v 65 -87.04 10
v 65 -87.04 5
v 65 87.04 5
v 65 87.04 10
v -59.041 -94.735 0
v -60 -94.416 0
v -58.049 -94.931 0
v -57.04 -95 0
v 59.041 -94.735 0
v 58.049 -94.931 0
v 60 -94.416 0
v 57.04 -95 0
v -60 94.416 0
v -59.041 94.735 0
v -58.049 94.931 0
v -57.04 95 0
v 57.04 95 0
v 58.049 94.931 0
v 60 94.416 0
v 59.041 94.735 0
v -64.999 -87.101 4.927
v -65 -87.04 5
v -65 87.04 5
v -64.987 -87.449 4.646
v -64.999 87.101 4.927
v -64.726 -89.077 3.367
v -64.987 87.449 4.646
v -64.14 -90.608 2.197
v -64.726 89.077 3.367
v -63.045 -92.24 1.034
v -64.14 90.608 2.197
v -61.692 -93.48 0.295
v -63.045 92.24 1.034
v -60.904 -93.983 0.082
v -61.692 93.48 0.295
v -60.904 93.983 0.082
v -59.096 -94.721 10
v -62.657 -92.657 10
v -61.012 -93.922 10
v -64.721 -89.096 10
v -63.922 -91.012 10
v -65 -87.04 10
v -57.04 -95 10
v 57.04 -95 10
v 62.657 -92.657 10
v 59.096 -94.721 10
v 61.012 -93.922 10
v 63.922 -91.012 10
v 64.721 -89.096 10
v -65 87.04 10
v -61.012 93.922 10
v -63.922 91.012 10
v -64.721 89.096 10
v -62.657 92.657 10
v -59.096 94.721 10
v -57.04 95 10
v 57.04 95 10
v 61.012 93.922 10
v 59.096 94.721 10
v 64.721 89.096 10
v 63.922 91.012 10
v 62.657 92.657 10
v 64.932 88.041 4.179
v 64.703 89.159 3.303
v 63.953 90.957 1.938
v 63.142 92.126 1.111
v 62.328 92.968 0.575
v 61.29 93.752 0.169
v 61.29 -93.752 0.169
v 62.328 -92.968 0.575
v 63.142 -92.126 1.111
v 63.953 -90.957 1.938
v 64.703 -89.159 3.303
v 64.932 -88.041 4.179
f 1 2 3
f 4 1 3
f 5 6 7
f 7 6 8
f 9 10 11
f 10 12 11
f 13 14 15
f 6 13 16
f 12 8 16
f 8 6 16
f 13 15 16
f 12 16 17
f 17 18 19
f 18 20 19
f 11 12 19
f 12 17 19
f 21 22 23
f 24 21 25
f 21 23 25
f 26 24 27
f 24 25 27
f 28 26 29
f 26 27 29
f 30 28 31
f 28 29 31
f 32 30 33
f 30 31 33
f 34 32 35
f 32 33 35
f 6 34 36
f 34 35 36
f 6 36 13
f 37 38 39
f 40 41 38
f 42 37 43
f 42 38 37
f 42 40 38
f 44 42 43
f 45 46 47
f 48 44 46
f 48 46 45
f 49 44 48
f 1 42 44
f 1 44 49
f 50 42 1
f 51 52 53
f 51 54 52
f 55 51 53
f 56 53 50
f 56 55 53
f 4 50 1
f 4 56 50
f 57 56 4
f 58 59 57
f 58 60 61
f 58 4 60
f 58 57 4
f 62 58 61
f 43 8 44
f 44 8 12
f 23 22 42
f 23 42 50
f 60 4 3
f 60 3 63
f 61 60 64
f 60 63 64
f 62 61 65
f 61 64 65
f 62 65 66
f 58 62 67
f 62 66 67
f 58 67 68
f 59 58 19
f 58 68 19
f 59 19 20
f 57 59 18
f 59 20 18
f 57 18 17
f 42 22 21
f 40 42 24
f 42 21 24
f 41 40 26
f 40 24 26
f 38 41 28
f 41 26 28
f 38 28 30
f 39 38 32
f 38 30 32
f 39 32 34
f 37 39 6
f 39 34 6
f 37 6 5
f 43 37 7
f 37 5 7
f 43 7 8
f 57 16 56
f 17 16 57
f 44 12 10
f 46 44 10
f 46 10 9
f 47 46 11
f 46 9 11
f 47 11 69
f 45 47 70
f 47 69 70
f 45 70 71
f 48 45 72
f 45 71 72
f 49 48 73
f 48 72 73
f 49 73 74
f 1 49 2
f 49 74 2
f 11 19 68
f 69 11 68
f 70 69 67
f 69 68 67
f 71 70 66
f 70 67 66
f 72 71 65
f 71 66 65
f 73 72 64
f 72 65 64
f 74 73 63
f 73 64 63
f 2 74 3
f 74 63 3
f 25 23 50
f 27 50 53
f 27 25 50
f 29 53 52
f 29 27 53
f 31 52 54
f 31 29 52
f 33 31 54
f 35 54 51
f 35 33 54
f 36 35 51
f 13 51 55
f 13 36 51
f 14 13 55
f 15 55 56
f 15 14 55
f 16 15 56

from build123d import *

# Parameters (mm, degrees)
F0_W        = 130
F0_H        = 190
F1_DEPTH    = 10
F2_T1_DEPTH = 49.9995000031
F3_T1_DEPTH = 199.0801997502


# Not quite as in the source:
# - a fillet or chamfer that OpenCascade refuses, or shapes differently, is made with other operations: its cross-section is extruded or revolved along the edge and cut away or added


with BuildPart() as f1:
    # F0 (on Top) → F1 (new body)
    with BuildSketch(Plane.XY):
        Rectangle(F0_W, F0_H)
    extrude(amount=F1_DEPTH)

    # F2: fillet of radius 8 on 4 edges, made by hand

    # F2_s2 → F2_t1 (cut)
    with BuildSketch(Plane.XY.offset(-19.9997500016)):
        with BuildLine():
            ThreePointArc((-65.0001, 87.0001), (-62.6569542495, 92.6569542495), (-57.0001, 95.0001))
            Line((-57.0001, 95.0001), (-57.0001, 95.1601))
            ThreePointArc((-57.0001, 95.1601), (-61.00005, 95.16), (-65, 95.16))
            Line((-65, 95.16), (-65.16, 95))
            ThreePointArc((-65.16, 95), (-65.16, 91.00005), (-65.1601, 87.0001))
            Line((-65.1601, 87.0001), (-65.0001, 87.0001))
        make_face()
        with BuildLine():
            ThreePointArc((65.0001, 87.0001), (62.6569542495, 92.6569542495), (57.0001, 95.0001))
            Line((57.0001, 95.0001), (57.0001, 95.1601))
            ThreePointArc((57.0001, 95.1601), (61.00005, 95.16), (65, 95.16))
            Line((65, 95.16), (65.16, 95))
            ThreePointArc((65.16, 95), (65.16, 91.00005), (65.1601, 87.0001))
            Line((65.1601, 87.0001), (65.0001, 87.0001))
        make_face()
        with BuildLine():
            ThreePointArc((57.0001, -95.0001), (62.6569542495, -92.6569542495), (65.0001, -87.0001))
            Line((65.0001, -87.0001), (65.1601, -87.0001))
            ThreePointArc((65.1601, -87.0001), (65.16, -91.00005), (65.16, -95))
            Line((65.16, -95), (65, -95.16))
            ThreePointArc((65, -95.16), (61.00005, -95.16), (57.0001, -95.1601))
            Line((57.0001, -95.1601), (57.0001, -95.0001))
        make_face()
        with BuildLine():
            ThreePointArc((-65.0001, -87.0001), (-62.6569542495, -92.6569542495), (-57.0001, -95.0001))
            Line((-57.0001, -95.0001), (-57.0001, -95.1601))
            ThreePointArc((-57.0001, -95.1601), (-61.00005, -95.16), (-65, -95.16))
            Line((-65, -95.16), (-65.16, -95))
            ThreePointArc((-65.16, -95), (-65.16, -91.00005), (-65.1601, -87.0001))
            Line((-65.1601, -87.0001), (-65.0001, -87.0001))
        make_face()
    extrude(amount=F2_T1_DEPTH, mode=Mode.SUBTRACT)

    # F3: fillet of radius 5 on 2 edges, made by hand

    # F3_s2 → F3_t1 (cut)
    with BuildSketch(Plane.XZ.offset(-99.5400998751)):
        with BuildLine():
            ThreePointArc((60, 0), (63.5355339059, 1.4644660941), (65, 5))
            Line((65, 5), (65, 0))
            Line((65, 0), (60, 0))
        make_face()
        with BuildLine():
            ThreePointArc((-65, 5), (-63.5355339059, 1.4644660941), (-60, 0))
            Line((-60, 0), (-65, 0))
            Line((-65, 0), (-65, 5))
        make_face()
    extrude(amount=F3_T1_DEPTH, mode=Mode.SUBTRACT)


solid = f1.part
